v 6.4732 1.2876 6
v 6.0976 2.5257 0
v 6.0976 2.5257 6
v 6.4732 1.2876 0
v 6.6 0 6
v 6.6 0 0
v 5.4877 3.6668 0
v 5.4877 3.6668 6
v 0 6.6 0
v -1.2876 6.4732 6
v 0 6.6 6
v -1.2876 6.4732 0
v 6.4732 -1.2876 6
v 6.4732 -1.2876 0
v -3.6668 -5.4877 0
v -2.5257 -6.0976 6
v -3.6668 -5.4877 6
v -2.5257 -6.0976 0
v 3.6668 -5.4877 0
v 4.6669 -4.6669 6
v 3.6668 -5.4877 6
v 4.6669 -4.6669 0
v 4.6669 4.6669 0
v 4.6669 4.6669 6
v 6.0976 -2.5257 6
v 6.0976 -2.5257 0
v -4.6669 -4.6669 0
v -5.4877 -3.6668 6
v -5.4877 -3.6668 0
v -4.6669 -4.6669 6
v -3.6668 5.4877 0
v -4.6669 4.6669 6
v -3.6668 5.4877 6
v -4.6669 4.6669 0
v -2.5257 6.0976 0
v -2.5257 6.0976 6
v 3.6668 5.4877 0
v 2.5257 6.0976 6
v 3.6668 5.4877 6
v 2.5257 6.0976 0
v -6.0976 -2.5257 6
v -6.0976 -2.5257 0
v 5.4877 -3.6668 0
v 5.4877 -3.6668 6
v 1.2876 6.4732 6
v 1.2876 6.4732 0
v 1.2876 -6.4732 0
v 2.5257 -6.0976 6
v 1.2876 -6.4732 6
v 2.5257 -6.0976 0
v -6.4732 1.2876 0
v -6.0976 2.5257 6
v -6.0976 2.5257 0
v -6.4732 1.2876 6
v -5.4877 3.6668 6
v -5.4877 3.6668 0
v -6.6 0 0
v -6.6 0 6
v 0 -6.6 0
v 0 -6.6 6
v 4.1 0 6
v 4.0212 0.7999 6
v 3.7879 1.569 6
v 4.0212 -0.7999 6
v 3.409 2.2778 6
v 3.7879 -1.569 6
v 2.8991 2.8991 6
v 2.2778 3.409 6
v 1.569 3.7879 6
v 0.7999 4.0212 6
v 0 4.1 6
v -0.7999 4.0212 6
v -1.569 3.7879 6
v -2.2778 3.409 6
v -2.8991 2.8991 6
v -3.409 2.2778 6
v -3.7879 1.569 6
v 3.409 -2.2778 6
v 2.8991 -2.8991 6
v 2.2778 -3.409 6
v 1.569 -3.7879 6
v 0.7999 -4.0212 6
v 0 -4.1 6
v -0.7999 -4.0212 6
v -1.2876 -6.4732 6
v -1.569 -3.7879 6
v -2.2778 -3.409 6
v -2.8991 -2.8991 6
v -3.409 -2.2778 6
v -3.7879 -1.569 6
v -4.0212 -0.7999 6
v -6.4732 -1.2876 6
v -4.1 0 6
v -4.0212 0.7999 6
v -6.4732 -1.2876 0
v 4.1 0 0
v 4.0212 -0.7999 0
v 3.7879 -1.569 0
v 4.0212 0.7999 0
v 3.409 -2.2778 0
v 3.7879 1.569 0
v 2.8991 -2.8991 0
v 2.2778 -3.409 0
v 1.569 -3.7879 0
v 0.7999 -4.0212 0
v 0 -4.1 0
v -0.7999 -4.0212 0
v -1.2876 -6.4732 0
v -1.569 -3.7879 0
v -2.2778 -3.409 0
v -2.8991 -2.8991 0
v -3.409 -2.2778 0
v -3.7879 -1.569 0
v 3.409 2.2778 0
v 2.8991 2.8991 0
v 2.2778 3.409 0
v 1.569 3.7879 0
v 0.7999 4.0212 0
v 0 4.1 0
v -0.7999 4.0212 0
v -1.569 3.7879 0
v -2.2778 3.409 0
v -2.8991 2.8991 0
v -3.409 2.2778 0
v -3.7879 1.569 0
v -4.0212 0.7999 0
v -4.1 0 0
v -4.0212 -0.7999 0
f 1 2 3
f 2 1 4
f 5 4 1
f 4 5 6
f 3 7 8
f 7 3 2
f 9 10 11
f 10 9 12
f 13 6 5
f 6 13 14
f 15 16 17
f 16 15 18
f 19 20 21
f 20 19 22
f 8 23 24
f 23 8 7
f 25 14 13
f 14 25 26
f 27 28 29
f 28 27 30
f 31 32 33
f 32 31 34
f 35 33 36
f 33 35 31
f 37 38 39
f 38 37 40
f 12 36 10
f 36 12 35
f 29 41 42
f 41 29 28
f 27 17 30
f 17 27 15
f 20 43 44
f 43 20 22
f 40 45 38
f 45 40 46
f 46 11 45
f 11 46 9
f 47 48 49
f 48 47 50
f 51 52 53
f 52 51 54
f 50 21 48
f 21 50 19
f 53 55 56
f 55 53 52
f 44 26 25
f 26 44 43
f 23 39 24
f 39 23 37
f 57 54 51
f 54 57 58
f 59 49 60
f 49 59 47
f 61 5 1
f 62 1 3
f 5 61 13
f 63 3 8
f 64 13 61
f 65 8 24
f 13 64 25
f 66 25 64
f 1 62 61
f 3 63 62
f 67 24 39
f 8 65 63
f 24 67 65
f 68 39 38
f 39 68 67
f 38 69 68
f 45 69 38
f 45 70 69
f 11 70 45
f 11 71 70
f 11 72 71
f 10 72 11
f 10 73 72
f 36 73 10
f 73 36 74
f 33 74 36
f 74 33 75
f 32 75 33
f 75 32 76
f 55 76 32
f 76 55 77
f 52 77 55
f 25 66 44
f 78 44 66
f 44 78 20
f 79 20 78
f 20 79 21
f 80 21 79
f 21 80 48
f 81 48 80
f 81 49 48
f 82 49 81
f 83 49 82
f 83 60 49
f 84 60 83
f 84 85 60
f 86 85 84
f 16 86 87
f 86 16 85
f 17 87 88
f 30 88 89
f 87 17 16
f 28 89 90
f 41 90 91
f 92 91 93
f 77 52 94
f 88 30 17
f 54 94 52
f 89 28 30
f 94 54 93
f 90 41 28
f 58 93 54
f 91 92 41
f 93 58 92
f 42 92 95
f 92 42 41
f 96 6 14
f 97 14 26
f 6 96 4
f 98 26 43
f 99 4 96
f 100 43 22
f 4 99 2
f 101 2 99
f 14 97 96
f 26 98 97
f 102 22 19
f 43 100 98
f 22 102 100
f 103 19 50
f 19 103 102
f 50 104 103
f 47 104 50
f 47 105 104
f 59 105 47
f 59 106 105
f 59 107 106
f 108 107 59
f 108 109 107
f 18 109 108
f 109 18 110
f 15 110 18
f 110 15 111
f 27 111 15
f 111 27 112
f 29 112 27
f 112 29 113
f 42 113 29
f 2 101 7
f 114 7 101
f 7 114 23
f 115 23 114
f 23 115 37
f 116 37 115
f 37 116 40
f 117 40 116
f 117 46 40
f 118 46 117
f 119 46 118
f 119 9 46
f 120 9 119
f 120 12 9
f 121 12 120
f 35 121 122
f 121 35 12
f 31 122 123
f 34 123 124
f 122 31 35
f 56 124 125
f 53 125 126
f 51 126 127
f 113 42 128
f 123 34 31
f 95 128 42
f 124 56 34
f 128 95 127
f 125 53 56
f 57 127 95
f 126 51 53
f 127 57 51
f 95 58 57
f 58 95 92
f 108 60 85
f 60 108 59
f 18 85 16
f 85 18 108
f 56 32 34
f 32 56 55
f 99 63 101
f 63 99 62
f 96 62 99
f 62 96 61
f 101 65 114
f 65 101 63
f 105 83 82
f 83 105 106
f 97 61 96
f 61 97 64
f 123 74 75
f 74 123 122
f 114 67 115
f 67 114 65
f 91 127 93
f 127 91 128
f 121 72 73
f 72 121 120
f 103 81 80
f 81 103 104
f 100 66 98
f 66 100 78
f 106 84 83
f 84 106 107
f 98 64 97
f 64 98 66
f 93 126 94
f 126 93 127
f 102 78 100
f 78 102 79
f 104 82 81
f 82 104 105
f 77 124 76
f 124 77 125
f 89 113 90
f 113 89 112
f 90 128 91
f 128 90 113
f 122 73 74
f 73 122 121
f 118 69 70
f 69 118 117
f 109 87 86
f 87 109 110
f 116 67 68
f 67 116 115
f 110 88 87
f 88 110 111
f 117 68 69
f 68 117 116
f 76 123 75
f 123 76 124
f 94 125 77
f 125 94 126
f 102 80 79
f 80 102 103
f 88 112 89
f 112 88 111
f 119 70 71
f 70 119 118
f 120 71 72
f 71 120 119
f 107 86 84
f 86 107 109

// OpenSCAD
$fn = 32;

// ----------------------------------------------------------------------
// Spacer sleeve: 13.2 / 8.2 x 6 mm
// ----------------------------------------------------------------------

// --- parameters (mm) ---
tube_d = 13.2;            // outside diameter
bore_d = 8.2;             // shaft bore
tube_l = 6;               // sleeve length

module sleeve() {
  cylinder(h = tube_l, d = tube_d);
}

difference() {
  sleeve();
  translate([0, 0, -1]) cylinder(h = tube_l + 2, d = bore_d);
}
